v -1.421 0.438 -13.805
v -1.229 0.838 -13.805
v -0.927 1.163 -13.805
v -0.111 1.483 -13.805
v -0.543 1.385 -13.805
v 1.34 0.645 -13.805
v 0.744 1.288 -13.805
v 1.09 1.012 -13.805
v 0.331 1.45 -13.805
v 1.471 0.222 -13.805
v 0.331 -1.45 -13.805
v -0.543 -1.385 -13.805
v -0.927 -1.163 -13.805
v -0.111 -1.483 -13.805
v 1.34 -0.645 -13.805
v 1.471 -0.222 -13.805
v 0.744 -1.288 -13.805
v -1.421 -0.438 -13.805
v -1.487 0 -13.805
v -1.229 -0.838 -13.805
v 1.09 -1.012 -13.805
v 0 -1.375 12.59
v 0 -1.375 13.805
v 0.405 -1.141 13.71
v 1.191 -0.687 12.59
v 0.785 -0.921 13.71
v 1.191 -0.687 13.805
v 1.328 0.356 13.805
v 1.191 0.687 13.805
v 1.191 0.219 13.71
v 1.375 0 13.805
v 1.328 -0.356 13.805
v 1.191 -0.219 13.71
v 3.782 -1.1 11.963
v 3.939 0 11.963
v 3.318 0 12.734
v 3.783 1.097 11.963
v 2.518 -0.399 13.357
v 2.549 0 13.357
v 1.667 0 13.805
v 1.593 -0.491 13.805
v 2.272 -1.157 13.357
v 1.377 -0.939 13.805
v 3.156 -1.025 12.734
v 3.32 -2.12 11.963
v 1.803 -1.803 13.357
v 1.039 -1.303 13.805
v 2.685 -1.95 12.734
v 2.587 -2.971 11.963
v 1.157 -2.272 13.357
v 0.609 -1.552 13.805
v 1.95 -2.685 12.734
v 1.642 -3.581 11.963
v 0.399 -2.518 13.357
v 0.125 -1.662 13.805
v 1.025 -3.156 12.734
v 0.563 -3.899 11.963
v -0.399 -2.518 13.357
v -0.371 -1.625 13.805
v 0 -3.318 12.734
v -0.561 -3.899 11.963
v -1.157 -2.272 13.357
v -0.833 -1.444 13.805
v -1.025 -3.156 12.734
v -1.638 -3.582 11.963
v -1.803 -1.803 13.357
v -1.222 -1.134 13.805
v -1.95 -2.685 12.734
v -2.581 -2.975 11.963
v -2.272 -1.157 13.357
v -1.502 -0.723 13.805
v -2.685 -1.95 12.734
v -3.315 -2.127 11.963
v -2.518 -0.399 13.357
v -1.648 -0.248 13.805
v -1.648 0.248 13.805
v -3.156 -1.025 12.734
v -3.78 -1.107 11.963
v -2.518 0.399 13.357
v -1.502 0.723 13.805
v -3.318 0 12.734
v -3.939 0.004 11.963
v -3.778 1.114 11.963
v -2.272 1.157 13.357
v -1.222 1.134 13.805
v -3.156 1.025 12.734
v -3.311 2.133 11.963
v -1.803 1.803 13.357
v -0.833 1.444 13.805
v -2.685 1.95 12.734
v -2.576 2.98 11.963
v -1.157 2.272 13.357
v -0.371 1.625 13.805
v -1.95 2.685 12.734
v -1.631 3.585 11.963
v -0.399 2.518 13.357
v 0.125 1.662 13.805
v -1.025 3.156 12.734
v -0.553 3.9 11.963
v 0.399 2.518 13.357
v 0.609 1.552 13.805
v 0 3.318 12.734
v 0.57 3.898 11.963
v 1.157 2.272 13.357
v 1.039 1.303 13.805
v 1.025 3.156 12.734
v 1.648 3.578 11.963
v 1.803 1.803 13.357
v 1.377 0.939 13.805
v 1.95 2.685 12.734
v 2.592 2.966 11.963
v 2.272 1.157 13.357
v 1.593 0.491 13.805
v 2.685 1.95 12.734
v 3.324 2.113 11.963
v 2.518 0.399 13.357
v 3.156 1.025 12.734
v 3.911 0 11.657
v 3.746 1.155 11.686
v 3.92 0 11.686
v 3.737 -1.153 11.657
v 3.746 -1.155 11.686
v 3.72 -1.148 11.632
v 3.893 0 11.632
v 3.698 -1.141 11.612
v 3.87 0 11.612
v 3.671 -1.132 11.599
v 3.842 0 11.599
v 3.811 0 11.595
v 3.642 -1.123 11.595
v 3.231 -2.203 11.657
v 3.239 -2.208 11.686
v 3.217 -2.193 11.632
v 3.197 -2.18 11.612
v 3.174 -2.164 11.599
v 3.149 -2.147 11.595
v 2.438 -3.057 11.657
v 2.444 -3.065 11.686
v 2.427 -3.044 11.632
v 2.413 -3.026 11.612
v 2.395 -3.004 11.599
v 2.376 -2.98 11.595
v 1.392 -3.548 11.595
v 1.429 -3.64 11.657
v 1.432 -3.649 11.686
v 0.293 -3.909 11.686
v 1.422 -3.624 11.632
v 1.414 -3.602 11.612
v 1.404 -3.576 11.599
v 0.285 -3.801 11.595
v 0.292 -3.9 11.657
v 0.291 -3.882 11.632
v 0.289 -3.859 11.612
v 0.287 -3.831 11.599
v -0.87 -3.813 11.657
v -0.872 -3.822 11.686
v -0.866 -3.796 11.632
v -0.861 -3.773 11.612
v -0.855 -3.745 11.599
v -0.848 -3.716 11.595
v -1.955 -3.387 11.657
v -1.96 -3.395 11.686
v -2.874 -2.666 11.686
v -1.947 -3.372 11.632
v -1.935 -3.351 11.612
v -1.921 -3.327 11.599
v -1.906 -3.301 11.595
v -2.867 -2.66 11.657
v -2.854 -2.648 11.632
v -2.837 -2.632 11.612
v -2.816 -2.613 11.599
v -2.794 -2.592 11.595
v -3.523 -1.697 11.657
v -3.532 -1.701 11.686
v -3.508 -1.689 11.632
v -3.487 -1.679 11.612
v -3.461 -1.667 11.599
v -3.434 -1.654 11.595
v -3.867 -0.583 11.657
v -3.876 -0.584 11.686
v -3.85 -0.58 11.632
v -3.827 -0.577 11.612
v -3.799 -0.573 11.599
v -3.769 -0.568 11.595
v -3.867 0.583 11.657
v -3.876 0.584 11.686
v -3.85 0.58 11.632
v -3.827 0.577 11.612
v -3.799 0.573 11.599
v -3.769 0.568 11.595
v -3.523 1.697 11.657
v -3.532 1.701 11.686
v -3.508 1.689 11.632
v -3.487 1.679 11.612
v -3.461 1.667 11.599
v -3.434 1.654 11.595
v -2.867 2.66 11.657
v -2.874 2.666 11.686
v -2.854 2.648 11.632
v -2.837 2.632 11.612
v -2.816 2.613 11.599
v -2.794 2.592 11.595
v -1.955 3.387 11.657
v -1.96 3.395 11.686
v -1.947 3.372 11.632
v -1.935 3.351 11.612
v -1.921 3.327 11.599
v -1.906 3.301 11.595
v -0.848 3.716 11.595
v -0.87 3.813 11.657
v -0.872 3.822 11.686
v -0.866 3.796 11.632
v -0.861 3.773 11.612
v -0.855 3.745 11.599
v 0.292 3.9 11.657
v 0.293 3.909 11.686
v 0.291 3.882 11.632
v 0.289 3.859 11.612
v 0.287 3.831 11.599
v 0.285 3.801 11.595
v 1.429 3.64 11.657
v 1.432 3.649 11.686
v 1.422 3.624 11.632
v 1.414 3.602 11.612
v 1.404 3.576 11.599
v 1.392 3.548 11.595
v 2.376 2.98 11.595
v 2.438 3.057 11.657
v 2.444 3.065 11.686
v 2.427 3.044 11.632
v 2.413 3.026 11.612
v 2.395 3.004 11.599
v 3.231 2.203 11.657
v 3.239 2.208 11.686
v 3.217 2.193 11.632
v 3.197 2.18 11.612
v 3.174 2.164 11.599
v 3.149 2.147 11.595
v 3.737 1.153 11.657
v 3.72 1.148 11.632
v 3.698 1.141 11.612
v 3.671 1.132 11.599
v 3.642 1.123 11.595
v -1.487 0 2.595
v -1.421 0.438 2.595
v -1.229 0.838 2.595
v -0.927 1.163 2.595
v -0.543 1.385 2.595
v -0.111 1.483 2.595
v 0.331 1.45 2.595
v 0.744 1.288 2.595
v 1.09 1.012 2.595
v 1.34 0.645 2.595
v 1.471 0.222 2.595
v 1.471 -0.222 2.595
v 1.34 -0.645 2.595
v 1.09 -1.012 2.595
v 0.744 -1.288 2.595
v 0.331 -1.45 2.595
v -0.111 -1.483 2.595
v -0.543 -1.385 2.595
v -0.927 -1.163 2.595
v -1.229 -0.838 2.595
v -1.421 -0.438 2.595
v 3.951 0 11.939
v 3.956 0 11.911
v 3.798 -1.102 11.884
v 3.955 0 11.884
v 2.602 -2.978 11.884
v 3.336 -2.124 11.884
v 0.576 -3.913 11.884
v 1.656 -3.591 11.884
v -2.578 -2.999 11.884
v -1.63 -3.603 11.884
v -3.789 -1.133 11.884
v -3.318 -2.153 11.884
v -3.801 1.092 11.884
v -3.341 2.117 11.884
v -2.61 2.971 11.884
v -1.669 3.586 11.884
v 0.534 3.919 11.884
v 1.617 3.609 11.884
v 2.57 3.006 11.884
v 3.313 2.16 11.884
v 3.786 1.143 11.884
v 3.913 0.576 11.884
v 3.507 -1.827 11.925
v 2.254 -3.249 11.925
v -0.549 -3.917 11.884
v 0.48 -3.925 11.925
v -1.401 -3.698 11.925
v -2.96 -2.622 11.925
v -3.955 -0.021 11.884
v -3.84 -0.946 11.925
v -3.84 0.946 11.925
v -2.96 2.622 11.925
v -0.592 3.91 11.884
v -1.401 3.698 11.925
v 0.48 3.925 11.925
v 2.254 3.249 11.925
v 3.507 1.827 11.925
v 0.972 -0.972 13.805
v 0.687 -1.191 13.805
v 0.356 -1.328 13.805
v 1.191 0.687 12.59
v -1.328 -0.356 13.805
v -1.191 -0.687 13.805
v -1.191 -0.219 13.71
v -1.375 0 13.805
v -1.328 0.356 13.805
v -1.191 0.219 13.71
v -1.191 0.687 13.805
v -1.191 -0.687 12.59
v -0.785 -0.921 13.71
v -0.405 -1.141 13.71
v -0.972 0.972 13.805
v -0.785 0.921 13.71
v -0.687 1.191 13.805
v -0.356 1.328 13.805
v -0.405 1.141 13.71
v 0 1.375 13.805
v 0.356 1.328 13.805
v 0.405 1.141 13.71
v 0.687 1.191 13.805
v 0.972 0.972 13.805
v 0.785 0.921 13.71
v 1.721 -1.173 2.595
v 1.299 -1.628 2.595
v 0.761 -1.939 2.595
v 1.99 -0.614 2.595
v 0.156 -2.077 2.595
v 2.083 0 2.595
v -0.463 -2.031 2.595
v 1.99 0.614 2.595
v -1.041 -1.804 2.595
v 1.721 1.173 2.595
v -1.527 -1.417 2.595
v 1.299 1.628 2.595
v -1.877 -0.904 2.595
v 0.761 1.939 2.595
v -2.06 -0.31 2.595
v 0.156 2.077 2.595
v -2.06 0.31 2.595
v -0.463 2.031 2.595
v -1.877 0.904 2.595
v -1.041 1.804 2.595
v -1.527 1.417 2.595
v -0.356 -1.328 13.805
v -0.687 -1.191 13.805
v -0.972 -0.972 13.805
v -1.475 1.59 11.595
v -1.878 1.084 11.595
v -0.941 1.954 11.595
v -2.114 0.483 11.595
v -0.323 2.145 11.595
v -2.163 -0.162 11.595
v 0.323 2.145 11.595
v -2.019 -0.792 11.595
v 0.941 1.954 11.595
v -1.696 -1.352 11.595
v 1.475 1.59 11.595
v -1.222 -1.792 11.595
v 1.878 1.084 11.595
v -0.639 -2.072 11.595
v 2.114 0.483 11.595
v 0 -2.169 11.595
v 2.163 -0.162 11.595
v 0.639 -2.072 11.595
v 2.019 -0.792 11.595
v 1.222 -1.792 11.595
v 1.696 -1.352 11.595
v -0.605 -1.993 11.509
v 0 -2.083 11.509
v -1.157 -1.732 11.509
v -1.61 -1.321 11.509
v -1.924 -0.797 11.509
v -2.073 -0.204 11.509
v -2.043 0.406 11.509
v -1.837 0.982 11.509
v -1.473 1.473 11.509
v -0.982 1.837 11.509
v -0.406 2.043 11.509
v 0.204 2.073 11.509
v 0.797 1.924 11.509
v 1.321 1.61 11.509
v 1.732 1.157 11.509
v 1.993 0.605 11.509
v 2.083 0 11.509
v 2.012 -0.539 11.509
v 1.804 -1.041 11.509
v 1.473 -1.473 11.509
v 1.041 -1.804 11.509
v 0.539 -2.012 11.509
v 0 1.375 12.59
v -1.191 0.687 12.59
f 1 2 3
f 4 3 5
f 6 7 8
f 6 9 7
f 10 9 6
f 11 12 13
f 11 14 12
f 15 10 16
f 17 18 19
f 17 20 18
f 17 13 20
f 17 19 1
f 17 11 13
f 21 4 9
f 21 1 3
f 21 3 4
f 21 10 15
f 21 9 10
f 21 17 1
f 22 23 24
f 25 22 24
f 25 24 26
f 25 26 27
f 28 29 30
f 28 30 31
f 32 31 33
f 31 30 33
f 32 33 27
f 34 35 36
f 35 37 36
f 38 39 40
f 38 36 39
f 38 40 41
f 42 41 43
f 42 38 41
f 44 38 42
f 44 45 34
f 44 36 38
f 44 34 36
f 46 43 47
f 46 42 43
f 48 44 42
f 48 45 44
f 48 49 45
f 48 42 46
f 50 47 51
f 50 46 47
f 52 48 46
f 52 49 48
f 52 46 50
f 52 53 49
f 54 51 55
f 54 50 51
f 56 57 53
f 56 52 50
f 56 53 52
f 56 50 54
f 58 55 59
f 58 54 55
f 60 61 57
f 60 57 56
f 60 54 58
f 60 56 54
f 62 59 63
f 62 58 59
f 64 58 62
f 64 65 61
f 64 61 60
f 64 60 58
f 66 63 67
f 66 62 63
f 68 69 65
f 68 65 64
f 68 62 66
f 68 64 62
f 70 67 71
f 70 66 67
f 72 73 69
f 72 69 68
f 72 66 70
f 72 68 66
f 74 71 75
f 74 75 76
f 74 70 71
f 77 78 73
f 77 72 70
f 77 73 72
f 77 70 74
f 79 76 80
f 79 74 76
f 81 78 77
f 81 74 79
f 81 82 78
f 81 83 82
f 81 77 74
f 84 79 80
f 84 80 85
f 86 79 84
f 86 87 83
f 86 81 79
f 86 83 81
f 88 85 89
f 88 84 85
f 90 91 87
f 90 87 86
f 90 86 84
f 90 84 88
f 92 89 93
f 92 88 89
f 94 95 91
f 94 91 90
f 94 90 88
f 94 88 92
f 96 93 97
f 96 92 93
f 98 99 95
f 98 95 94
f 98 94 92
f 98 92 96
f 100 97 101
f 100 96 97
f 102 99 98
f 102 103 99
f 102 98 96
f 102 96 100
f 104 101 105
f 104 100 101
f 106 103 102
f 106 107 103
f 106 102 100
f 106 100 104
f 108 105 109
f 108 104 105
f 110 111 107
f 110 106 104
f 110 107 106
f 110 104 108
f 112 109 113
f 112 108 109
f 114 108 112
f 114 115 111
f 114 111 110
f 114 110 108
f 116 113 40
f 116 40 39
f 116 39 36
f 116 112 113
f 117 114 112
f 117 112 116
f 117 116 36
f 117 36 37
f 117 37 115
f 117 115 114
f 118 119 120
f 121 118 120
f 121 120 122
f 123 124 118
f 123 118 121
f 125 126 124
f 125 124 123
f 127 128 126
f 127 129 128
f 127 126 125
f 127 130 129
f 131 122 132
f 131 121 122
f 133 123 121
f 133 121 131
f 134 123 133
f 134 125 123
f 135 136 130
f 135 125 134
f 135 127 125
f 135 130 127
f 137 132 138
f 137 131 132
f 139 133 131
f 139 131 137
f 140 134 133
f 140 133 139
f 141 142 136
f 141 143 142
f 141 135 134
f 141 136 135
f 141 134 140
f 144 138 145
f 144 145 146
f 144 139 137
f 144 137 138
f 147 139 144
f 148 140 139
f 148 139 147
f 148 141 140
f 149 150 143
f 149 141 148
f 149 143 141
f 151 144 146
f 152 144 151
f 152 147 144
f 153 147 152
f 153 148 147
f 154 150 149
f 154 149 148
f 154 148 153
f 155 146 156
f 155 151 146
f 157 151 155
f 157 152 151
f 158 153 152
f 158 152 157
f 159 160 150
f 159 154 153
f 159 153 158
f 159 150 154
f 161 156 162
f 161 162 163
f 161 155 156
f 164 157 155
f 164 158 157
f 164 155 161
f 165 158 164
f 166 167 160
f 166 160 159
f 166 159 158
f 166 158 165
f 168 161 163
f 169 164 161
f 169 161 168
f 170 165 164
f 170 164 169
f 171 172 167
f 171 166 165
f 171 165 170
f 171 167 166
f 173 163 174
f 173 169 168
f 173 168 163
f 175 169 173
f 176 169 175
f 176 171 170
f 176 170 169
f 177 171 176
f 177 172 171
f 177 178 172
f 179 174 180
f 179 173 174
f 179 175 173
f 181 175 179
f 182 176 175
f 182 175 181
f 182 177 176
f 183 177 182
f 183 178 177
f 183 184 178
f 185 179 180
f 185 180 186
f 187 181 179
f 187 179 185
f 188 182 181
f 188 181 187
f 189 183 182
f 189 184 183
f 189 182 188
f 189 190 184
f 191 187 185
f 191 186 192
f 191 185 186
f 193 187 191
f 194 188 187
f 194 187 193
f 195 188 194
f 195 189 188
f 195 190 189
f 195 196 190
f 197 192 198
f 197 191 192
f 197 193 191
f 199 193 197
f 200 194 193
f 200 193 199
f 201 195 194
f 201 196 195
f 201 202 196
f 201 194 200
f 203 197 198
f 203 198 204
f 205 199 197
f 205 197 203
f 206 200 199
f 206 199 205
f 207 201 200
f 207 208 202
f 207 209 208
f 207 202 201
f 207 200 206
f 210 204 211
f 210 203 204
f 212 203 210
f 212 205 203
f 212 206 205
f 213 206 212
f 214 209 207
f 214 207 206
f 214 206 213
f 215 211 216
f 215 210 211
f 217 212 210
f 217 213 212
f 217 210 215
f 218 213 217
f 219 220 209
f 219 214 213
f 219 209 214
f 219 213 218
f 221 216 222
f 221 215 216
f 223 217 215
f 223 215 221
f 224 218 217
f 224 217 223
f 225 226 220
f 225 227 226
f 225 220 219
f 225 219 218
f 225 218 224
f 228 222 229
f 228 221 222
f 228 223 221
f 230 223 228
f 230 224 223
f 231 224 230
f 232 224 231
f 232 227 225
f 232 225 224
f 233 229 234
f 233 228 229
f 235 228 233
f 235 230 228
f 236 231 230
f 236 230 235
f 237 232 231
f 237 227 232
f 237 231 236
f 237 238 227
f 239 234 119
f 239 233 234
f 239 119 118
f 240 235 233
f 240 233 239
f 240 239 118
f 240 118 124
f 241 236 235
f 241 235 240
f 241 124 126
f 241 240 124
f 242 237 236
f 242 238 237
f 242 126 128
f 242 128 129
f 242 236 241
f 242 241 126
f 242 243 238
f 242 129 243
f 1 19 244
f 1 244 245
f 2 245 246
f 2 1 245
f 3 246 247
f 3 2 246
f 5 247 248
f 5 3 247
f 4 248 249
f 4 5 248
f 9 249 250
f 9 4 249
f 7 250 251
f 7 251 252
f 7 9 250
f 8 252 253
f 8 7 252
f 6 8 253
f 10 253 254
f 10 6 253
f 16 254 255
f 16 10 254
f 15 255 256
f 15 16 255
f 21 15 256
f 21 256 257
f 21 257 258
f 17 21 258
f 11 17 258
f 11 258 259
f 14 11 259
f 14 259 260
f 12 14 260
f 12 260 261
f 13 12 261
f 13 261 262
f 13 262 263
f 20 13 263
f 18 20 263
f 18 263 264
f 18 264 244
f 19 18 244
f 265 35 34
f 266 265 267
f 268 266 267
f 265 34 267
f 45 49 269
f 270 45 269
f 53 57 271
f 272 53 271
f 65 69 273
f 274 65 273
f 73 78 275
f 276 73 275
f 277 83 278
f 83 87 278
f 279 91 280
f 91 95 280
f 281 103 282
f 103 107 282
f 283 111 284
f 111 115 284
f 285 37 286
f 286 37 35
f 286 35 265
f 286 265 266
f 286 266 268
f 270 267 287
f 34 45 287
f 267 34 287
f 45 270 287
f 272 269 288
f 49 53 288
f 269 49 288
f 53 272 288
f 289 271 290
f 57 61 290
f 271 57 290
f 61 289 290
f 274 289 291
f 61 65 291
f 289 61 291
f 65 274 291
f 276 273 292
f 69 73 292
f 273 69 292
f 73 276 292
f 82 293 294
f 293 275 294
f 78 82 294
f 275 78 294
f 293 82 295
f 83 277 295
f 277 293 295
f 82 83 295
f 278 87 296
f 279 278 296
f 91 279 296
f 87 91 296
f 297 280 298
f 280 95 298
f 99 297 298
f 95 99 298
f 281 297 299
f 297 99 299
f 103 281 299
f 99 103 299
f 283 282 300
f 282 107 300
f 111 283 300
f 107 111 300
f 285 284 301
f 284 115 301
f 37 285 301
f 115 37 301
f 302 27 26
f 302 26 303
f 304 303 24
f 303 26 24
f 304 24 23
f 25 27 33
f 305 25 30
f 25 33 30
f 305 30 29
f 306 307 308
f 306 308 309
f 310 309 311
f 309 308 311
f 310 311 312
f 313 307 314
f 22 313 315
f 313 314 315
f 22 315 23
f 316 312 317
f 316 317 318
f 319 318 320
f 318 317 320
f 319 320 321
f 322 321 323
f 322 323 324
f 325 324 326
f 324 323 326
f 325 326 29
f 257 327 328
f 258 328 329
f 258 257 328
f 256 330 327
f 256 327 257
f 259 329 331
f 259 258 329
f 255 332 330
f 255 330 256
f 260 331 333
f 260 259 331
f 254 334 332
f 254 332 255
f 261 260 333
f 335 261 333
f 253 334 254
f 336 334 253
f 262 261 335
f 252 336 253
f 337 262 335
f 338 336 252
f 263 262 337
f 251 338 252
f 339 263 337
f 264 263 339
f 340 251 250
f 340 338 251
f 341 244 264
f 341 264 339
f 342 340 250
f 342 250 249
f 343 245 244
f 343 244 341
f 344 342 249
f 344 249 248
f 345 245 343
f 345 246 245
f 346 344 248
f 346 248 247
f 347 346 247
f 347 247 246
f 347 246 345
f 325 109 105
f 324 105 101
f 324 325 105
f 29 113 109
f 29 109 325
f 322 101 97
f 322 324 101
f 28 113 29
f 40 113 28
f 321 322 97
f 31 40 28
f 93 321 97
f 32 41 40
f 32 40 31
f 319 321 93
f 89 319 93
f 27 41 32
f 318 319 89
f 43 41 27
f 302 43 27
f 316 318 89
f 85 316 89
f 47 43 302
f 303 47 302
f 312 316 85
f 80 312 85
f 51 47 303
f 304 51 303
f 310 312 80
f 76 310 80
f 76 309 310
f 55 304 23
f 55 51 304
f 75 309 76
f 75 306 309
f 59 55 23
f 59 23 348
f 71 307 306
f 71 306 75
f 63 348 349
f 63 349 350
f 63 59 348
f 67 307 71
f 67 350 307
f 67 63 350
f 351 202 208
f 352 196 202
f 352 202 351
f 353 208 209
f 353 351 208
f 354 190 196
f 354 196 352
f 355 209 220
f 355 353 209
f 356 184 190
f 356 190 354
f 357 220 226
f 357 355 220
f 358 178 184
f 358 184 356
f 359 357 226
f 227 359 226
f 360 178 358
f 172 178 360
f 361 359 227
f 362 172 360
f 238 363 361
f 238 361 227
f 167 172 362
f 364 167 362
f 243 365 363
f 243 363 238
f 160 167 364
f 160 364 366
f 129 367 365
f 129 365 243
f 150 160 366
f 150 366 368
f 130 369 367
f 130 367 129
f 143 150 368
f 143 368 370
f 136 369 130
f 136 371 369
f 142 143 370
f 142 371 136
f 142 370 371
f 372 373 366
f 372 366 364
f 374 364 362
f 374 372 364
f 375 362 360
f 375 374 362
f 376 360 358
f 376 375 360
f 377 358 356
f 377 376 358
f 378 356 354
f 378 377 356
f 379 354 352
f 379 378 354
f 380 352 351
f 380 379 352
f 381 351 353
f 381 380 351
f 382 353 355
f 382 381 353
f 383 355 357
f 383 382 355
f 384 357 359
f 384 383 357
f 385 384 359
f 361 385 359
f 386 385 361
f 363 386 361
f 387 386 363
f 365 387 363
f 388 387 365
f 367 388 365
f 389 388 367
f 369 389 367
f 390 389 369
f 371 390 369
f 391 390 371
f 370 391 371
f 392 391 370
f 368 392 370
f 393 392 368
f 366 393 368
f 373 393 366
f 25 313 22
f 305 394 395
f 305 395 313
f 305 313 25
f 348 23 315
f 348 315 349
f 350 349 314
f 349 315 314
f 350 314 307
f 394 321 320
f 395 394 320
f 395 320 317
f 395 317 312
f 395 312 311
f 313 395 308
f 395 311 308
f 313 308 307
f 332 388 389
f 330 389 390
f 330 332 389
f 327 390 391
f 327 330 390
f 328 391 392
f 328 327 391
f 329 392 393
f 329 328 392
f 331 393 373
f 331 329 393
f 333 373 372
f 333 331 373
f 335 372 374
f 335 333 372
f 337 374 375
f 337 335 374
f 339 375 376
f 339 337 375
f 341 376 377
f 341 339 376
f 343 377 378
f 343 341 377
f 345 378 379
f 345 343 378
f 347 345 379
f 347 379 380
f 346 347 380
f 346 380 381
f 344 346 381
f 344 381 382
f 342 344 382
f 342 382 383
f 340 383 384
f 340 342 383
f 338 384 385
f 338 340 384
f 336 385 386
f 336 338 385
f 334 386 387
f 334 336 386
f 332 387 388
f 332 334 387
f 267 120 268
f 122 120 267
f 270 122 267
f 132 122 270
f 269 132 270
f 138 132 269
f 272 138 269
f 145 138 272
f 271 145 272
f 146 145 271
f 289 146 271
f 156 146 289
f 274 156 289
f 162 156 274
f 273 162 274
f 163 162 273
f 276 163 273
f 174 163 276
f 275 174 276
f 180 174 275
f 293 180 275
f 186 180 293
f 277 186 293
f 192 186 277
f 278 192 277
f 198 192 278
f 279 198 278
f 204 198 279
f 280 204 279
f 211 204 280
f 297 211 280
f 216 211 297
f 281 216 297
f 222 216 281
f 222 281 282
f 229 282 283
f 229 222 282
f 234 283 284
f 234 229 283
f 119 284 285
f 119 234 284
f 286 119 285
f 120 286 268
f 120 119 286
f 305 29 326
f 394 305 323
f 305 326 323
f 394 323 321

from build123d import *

# Parameters (mm, degrees)
CUT_EXTRUDE1_DEPTH = 1.21539
FILLET1_R          = 0.11049
SKETCH10_R         = 3.811240777
SKETCH10_R_2       = 1.4874875
CUT_EXTRUDE4_DEPTH = 16.4


# Read off the part's stored shape, not the designer's step: Split1
with BuildPart() as part:
    # Sketch3 → Revolve1 (revolve)
    with BuildSketch(Plane(origin=(0, 0, 0), x_dir=(0, 0, -1), z_dir=(1, 0, 0)), mode=Mode.PRIVATE) as revolve1_sk:
        with BuildLine():
            Line((-13.8049, 0), (-13.8049, 1.666875))
            ThreePointArc((-13.8049, 1.666875), (-13.052170588, 2.967189774), (-11.92657, 3.9624))
            Line((-11.92657, 3.9624), (-11.5951, 3.903952896))
            Line((-11.5951, 3.903952896), (-11.5951, 2.0828))
            Line((-11.5951, 2.0828), (13.2095875, 2.0828))
            Line((13.2095875, 2.0828), (13.8049, 1.4874875))
            Line((13.8049, 1.4874875), (13.8049, 0))
            Line((13.8049, 0), (-13.8049, 0))
        make_face()
    revolve(revolve1_sk.sketch.rotate(Axis((0, 0, 13.8049), (0, 0, -1)), 90), axis=Axis((0, 0, 13.8049), (0, 0, -1)))

    # Sketch4 → Cut-Extrude1 (cut)
    with BuildSketch(Plane.XY.offset(13.8049)):
        Polygon((-1.190625, -0.687407664), (0, -1.374815329), (1.190625, -0.687407664), (1.190625, 0.687407664), (0, 1.374815329), (-1.190625, 0.687407664), align=None)
    extrude(amount=-CUT_EXTRUDE1_DEPTH, mode=Mode.SUBTRACT)

    # Cut-Extrude2 cone 1 section (through the dimple's axis) → Cut-Extrude2 (revolve, cut)
    with BuildSketch(Plane(origin=(0, 0, 13.8049), x_dir=(0, -1, 0), z_dir=(1, 0, 0))):
        Polygon((0, 0), (1.374815329, 0), (0, 0.79375), align=None)
    revolve(axis=Axis((0, 0, 13.8049), (0, 0, -1)), mode=Mode.SUBTRACT)

    # Fillet1
    fillet1_edges = [part.edges().sort_by_distance(p)[0] for p in [
        (-3.903952896, 0, 11.5951),
        (-3.9624, 0, 11.92657),
    ]]
    fillet(fillet1_edges, radius=FILLET1_R)


with BuildPart() as body_2:
    # Split1: the piece on the far side of the plane
    add(part.part)
    split(bisect_by=Plane.XY.offset(11.5951), keep=Keep.BOTTOM)


with BuildPart() as part_1:
    add(part.part)

    # Split1
    split(bisect_by=Plane.XY.offset(11.5951), keep=Keep.TOP)

    add(body_2.part)  # Boss-Extrude1 merges body 2
    # Boss-Extrude1 cone 1 section (through the dimple's axis) → Boss-Extrude1 (revolve)
    with BuildSketch(Plane(origin=(0, 0, 11.5951), x_dir=(0, -1, 0), z_dir=(1, 0, 0))):
        Polygon((0, 0), (2.168725958, 0), (0, 2.168725958), align=None)
    revolve(axis=Axis((0, 0, 11.5951), (0, 0, -1)))

    # Sketch10 → Cut-Extrude4 (cut)
    with BuildSketch(Plane(origin=(0, 0, -13.8049), x_dir=(-1, 0, 0), z_dir=(0, 0, -1))):
        Circle(SKETCH10_R)
        Circle(SKETCH10_R_2, mode=Mode.SUBTRACT)
    extrude(amount=-CUT_EXTRUDE4_DEPTH, mode=Mode.SUBTRACT)


solid = part_1.part
